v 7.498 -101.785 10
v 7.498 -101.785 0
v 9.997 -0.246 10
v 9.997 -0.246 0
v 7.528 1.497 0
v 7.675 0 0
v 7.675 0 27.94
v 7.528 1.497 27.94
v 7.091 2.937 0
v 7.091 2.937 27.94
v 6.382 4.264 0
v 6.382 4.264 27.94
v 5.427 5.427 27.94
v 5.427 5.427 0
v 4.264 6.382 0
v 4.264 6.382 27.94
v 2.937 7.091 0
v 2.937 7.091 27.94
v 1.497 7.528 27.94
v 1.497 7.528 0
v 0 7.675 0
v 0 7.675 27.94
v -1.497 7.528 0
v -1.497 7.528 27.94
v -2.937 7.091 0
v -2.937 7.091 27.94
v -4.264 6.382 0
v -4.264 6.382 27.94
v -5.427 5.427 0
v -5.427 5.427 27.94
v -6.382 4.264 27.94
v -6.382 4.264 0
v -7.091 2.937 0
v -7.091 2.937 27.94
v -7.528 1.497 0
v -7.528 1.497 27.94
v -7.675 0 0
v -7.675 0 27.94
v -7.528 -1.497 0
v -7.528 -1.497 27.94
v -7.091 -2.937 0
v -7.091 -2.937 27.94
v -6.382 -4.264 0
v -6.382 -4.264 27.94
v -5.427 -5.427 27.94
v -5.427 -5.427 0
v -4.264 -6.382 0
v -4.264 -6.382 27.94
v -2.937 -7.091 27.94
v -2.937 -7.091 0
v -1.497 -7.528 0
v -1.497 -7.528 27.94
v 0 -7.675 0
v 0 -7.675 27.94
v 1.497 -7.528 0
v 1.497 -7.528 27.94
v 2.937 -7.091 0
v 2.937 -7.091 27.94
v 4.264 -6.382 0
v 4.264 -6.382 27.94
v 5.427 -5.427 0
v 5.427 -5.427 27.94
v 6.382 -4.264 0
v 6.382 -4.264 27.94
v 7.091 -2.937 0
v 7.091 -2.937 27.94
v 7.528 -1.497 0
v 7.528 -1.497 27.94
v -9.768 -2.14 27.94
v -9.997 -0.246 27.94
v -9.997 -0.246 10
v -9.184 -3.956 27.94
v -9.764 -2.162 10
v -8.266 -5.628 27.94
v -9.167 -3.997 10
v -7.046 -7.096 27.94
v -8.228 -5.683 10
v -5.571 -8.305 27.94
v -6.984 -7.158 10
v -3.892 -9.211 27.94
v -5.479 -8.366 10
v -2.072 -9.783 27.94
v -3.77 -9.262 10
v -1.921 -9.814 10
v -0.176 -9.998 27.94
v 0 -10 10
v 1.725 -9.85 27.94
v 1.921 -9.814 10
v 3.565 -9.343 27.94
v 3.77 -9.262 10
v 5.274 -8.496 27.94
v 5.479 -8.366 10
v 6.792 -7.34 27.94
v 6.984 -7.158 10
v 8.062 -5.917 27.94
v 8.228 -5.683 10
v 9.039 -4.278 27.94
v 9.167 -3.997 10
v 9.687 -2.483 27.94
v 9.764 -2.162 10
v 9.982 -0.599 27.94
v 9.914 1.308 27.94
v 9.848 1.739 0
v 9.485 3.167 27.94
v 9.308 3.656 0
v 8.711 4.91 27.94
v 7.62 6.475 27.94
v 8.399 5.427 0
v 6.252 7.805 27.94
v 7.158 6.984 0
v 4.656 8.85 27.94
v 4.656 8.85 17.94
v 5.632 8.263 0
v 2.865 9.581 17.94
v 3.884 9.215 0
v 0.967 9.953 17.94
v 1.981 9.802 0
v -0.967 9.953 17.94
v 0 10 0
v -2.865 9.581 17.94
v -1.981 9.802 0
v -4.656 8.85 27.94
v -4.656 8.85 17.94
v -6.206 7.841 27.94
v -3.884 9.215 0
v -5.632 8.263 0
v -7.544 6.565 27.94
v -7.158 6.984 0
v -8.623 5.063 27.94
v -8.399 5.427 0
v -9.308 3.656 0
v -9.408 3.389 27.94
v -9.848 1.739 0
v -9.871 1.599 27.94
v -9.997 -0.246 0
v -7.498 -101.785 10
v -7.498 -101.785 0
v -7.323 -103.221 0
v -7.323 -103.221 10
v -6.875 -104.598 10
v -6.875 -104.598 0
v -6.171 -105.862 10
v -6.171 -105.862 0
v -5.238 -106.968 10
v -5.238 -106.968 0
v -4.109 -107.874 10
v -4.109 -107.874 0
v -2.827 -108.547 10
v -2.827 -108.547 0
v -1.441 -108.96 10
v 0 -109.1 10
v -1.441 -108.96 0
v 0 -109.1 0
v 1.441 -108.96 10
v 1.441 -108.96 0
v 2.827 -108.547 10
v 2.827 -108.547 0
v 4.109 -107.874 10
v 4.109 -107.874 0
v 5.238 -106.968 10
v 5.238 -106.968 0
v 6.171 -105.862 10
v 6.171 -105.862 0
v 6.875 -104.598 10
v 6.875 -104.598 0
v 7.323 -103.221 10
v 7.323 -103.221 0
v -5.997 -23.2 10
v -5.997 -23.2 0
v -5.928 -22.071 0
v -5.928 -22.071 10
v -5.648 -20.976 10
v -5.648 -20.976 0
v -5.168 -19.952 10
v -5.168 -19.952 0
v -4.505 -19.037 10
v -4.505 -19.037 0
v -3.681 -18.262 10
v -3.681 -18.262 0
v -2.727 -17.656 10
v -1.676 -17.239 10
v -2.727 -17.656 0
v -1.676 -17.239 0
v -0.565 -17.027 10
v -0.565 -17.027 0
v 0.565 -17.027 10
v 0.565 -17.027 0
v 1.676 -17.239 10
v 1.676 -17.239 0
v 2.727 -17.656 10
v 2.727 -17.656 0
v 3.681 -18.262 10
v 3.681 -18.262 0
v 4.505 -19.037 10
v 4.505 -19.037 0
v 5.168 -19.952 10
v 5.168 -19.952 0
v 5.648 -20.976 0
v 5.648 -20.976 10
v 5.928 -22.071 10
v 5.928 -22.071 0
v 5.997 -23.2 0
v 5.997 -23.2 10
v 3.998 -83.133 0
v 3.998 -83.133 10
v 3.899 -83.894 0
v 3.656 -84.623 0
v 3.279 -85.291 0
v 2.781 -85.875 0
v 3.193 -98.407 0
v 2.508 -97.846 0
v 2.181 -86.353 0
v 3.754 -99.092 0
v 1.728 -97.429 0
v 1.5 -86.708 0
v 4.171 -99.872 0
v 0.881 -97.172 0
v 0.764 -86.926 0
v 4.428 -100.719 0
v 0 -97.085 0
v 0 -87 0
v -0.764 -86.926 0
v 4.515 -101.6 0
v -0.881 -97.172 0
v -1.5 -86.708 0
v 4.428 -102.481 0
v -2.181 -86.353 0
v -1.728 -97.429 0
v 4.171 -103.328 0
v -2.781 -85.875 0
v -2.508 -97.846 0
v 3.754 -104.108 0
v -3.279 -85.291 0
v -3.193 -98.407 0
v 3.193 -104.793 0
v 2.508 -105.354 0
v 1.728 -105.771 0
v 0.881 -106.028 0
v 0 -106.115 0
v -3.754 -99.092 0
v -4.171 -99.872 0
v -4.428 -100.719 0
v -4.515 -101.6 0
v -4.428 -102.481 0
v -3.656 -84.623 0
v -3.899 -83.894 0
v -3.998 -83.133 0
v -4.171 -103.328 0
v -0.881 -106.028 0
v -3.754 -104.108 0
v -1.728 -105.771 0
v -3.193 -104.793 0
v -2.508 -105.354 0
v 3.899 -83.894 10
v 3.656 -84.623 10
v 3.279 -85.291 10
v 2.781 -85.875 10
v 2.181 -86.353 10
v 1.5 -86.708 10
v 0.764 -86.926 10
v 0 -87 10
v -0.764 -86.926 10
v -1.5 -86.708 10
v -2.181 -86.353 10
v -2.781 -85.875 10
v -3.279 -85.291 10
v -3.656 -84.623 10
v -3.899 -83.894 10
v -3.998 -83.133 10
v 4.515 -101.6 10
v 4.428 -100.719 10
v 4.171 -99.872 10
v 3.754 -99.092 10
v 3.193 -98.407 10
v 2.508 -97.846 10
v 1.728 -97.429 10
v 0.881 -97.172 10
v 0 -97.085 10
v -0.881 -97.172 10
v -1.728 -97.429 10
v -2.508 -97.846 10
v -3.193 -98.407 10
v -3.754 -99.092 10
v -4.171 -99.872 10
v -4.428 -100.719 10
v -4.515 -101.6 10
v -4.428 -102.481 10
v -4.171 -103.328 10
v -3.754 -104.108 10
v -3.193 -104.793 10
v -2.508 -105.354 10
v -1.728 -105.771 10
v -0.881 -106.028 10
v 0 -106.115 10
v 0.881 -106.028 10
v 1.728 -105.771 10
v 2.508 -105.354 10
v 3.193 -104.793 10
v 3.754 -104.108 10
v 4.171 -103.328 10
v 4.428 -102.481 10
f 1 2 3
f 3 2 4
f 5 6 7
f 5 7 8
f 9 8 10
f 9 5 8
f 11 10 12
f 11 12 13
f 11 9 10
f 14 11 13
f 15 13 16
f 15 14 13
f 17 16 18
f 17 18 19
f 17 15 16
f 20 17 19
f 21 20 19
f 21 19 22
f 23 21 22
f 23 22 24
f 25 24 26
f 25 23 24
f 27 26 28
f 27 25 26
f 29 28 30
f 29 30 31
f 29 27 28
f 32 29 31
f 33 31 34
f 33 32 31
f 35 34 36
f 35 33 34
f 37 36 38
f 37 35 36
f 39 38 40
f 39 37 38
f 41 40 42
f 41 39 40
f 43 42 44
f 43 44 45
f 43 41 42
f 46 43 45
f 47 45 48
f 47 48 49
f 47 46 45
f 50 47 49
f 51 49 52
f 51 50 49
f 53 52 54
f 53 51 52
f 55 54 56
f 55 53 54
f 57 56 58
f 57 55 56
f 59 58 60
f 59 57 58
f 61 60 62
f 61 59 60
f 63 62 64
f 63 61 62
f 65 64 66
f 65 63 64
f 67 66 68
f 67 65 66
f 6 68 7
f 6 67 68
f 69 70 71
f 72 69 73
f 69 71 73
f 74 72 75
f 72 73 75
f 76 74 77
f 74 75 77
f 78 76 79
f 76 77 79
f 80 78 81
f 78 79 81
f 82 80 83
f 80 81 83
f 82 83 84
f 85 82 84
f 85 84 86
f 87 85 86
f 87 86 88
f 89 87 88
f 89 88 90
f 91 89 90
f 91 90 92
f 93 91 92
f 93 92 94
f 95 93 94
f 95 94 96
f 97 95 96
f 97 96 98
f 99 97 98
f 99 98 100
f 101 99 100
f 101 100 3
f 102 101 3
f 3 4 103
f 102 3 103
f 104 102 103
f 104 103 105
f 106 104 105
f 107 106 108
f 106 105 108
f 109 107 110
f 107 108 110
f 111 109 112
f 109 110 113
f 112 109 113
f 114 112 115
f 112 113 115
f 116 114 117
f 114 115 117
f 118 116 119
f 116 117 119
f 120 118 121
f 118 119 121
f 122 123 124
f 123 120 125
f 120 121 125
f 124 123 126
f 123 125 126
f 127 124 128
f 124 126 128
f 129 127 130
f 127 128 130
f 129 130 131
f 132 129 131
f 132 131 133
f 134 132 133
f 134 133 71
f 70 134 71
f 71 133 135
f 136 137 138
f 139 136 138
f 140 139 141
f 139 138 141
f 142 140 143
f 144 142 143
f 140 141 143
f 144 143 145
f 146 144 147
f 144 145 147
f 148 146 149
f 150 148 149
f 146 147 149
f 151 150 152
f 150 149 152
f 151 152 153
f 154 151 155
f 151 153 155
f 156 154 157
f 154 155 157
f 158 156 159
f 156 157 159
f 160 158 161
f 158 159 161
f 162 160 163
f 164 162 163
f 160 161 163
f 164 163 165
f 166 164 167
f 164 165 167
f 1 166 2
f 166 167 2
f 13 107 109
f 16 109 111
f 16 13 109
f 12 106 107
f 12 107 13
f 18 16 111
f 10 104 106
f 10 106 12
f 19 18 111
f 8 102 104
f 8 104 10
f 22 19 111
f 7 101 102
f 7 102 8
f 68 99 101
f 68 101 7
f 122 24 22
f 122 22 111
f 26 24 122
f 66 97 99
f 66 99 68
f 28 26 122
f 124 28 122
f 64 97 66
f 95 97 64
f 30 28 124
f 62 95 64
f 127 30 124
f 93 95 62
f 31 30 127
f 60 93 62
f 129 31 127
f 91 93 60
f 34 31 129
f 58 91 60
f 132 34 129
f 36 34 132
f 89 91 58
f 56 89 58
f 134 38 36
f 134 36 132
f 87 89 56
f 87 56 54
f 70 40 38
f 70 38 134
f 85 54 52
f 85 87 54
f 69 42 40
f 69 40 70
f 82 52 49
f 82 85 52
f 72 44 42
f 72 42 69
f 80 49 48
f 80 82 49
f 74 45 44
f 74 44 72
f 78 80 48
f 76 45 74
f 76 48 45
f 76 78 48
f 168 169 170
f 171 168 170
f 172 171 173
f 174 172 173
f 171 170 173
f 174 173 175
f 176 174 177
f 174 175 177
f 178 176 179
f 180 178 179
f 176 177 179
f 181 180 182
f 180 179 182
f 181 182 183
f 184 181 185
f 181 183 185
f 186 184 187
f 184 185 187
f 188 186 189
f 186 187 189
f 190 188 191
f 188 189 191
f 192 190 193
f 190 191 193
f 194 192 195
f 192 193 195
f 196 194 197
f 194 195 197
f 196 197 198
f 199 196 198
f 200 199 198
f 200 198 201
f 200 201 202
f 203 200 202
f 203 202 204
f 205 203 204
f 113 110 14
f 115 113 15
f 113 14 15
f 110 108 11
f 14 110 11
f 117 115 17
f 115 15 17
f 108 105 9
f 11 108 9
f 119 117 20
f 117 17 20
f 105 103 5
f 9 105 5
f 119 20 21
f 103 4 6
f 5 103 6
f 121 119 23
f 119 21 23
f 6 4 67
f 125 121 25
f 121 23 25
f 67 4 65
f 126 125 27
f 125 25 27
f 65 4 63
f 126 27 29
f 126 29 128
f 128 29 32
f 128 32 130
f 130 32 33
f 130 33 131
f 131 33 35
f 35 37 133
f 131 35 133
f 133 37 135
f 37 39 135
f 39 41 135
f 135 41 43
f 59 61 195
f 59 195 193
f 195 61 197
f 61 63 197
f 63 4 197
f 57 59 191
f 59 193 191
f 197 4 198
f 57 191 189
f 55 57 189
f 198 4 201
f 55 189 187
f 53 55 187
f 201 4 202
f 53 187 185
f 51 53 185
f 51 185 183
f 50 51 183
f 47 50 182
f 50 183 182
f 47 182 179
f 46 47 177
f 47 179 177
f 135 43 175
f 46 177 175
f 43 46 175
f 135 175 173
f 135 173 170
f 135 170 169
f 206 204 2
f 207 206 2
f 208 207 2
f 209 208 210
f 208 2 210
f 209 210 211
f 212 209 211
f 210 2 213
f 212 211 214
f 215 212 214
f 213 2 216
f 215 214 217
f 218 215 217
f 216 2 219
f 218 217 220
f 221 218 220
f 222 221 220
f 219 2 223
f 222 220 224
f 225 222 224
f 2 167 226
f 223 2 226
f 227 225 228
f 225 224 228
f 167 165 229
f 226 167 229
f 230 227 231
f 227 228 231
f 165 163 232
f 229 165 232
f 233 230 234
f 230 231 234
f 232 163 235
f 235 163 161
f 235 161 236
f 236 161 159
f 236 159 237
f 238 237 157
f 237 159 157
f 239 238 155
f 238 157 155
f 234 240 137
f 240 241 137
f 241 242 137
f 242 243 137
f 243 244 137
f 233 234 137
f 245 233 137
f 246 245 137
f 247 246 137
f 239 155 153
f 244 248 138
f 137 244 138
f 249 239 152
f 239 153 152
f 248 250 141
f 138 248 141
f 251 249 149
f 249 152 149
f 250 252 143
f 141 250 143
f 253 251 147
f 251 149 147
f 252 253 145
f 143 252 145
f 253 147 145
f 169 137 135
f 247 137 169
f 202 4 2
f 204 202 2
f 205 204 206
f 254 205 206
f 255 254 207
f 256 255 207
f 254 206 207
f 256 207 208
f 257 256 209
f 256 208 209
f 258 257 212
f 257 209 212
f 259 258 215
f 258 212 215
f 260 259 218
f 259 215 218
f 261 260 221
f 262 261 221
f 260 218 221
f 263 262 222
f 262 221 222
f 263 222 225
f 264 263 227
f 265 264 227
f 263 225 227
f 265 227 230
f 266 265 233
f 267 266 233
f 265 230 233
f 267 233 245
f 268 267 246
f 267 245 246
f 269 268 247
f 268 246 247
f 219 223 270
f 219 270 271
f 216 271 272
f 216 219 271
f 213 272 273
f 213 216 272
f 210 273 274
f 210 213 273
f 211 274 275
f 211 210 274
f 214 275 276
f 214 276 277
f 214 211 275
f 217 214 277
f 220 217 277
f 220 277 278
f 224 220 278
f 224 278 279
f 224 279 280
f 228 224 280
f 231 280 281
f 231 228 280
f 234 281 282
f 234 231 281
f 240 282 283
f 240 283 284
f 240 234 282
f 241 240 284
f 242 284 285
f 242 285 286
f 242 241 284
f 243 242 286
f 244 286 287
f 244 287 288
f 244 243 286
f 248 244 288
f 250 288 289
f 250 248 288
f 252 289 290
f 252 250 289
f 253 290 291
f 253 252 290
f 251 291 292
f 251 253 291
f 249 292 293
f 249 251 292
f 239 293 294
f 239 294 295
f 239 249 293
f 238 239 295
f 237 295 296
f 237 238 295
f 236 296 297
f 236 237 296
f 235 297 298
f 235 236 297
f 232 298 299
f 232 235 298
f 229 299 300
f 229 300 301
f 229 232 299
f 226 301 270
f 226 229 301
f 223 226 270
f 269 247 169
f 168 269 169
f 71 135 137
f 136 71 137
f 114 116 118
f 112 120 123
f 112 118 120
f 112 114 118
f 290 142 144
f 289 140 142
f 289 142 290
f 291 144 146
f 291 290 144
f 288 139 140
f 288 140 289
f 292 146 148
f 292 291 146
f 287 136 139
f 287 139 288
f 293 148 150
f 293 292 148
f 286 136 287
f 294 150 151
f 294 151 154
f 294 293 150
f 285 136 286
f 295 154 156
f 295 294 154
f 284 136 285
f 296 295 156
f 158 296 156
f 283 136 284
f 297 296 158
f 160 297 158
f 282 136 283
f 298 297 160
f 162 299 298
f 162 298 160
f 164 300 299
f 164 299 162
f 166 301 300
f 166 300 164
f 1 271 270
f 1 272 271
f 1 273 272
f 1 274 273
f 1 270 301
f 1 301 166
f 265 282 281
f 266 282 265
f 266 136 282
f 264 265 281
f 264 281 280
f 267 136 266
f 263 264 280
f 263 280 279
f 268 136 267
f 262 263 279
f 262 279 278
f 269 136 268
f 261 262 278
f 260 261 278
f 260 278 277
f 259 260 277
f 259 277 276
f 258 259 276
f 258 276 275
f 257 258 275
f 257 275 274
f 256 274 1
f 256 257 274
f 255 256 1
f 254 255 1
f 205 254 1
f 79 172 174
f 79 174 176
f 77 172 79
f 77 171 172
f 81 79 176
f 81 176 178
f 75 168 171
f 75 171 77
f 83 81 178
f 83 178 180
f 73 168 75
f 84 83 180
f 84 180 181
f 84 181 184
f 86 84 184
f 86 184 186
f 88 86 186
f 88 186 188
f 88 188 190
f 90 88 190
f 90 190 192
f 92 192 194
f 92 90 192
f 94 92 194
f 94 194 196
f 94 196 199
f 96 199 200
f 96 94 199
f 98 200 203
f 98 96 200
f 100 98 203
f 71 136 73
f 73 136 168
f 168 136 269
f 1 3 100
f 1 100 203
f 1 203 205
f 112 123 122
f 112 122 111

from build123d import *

# Parameters (mm, degrees)
SKETCH1_R           = 4.515
BOSS_EXTRUDE2_DEPTH = 10
SKETCH1_6_R         = 7.675
BOSS_EXTRUDE3_DEPTH = 27.94
SKETCH2_W           = 20.025396677
SKETCH2_H           = 9.808205023
CUT_EXTRUDE1_DEPTH  = 10


with BuildPart() as part:
    # Sketch1 → Boss-Extrude2 (new body)
    with BuildSketch(Plane.XY):
        with BuildLine():
            ThreePointArc((9.996972197, -0.246062766), (5.5e-08, -10), (-9.996972195, -0.246062876))
            Line((-9.996972195, -0.246062876), (-7.497729139, -101.784547426))
            ThreePointArc((-7.497729139, -101.784547426), (1.58e-07, -109.1), (7.497729147, -101.784547111))
            Line((7.497729147, -101.784547111), (9.996972197, -0.246062766))
        make_face()
        with BuildLine():
            Line((5.996665744, -23.199999888), (3.997777167, -83.133333141))
            ThreePointArc((3.997777167, -83.133333141), (1.93e-07, -87), (-3.997777154, -83.133333527))
            Line((-3.997777154, -83.133333527), (-5.996665745, -23.199999845))
            ThreePointArc((-5.996665745, -23.199999845), (2.1e-08, -17), (5.996665744, -23.199999888))
        make_face(mode=Mode.SUBTRACT)
        with Locations((0, -101.6)):
            Circle(SKETCH1_R, mode=Mode.SUBTRACT)
    extrude(amount=BOSS_EXTRUDE2_DEPTH)

    # Sketch1<6> → Boss-Extrude3 (add)
    with BuildSketch(Plane.XY):
        with BuildLine():
            ThreePointArc((10, 0), (-0.123040752, 9.99924302), (-9.996972195, -0.246062876))
            ThreePointArc((-9.996972195, -0.246062876), (5.5e-08, -10), (9.996972197, -0.246062766))
            ThreePointArc((9.996972197, -0.246062766), (9.999243021, -0.123040697), (10, 0))
        make_face()
        Circle(SKETCH1_6_R, mode=Mode.SUBTRACT)
    extrude(amount=BOSS_EXTRUDE3_DEPTH)

    # Sketch2 → Cut-Extrude1 (cut)
    with BuildSketch(Plane.XY.offset(27.94)):
        with Locations((-0.020605473, 13.754102512)):
            Rectangle(SKETCH2_W, SKETCH2_H)
    extrude(amount=-CUT_EXTRUDE1_DEPTH, mode=Mode.SUBTRACT)


solid = part.part
